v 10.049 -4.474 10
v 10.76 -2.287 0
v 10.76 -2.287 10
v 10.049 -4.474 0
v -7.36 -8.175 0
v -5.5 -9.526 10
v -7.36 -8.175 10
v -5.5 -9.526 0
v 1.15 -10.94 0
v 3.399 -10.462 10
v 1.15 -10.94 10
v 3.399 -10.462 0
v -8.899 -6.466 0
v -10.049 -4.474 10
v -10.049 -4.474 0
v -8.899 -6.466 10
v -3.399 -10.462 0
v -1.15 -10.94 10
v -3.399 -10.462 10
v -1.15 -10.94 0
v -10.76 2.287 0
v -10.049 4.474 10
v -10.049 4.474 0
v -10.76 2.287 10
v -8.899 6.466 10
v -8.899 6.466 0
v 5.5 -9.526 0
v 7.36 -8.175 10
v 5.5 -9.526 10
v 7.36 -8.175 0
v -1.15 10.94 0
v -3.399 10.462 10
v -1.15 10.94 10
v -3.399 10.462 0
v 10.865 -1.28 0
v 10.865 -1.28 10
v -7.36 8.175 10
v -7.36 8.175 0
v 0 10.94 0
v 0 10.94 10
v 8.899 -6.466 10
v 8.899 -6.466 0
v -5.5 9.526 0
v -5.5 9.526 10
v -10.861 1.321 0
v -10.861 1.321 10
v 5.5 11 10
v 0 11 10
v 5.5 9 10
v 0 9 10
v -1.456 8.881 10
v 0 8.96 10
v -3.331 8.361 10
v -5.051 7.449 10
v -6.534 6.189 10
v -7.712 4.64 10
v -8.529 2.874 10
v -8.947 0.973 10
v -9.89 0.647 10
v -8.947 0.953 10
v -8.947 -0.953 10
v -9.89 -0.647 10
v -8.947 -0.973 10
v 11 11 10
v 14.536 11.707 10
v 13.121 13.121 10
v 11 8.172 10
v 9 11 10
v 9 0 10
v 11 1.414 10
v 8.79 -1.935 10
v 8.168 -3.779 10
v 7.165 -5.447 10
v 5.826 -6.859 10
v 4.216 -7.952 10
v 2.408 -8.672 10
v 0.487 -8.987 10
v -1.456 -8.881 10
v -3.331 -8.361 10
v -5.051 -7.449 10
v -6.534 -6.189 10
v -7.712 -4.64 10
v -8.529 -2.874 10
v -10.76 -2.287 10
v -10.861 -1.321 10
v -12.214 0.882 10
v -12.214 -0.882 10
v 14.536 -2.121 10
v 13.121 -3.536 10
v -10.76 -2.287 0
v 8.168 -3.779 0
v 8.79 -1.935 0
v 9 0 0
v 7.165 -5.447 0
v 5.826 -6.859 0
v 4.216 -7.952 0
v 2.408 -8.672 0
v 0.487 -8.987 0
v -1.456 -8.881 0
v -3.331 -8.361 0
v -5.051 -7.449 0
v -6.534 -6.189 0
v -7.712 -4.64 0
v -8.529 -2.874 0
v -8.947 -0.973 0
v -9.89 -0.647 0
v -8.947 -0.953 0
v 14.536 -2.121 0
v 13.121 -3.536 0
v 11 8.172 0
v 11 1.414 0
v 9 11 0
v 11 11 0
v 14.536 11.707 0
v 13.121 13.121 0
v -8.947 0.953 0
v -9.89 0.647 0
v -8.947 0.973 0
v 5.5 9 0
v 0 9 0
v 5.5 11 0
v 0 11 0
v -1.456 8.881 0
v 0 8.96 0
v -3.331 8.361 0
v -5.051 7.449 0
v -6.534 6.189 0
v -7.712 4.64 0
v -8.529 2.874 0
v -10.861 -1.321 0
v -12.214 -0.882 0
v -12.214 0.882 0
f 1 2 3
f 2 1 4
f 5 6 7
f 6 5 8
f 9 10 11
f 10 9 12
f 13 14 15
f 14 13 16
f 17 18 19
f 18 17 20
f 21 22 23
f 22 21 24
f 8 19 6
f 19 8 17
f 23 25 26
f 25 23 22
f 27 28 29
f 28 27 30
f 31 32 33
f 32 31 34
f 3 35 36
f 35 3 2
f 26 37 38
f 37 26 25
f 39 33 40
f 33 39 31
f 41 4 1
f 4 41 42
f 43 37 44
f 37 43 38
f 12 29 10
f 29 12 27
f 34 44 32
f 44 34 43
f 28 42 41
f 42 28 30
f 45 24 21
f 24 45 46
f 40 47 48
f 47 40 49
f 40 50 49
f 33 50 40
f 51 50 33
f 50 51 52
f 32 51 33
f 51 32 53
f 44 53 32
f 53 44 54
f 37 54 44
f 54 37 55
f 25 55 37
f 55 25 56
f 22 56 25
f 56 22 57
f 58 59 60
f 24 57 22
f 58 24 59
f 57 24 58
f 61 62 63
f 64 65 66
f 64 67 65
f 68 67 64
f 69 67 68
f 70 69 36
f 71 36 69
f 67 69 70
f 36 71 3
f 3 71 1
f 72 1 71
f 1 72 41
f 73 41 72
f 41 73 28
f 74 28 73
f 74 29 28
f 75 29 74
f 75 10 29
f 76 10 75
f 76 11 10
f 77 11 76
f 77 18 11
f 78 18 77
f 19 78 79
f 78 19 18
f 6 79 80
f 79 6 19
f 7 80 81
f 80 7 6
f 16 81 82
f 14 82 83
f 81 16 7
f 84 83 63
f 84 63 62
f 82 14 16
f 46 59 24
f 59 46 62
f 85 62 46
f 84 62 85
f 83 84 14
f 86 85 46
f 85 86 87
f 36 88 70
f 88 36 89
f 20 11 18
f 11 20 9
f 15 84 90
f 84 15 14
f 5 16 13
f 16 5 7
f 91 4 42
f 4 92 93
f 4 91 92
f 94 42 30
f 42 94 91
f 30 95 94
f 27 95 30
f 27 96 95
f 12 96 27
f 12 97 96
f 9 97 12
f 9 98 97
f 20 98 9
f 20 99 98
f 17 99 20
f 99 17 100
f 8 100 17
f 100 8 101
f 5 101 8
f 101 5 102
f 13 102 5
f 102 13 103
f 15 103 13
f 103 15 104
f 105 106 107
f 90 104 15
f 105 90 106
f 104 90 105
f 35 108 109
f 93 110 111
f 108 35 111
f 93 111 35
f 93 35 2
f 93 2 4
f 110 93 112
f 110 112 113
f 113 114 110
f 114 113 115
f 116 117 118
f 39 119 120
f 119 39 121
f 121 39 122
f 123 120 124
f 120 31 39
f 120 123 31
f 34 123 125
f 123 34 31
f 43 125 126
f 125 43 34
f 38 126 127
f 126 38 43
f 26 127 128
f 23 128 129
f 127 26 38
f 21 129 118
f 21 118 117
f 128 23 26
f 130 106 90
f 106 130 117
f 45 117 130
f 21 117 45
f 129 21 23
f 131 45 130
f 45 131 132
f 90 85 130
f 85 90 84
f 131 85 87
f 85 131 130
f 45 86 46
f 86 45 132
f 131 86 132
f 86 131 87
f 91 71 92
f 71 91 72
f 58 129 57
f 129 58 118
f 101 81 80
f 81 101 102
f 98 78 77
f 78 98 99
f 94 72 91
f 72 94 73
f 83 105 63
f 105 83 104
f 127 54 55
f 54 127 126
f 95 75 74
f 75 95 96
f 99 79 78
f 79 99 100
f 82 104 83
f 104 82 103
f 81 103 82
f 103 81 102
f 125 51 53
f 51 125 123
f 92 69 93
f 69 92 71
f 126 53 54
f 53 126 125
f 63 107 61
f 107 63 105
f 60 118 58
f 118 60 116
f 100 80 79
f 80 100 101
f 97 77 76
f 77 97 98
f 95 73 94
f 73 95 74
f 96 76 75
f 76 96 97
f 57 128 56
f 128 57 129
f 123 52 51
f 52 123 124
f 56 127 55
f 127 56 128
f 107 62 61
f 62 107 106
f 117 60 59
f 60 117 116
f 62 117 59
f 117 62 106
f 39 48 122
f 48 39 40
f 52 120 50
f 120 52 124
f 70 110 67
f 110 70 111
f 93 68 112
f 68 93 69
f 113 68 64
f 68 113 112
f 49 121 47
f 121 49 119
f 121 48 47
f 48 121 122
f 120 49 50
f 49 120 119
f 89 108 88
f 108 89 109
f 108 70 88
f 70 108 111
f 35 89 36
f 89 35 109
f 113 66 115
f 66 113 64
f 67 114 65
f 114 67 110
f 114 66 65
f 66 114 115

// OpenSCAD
// Clip to attach Apple bluetooth keyboard (2 AA battery version) to
// Apple bluetooth (magic somethingorother) touchpad
// by Neil Isaac <isaac.neil@gmail.com> 28 Dec. 2013

// Length of the clip (distance from left side to right side)
// 75mm for the long clip, 10mm for the end clips
length = 10;

// The radius of the battery holder
// Adjust as needed for a snug fit
inner_radius = 9;

// Thickness of the cylindrical shell
// Adjust for structure and print quality
thickness = 2;

// Radius of the notch for the rubber pads
notch_radius = 1.1;

// Length of the flat part on top of the battery holder 
cover_length = 11;

// Length of the straight part for support under the battery holder
curl_length = 5.5;

// Bump on the bottom as a support
bump_radius = 1.5;

// Pen holder height
// Set to 0 to remove
pen_height = 5;

outer_radius = inner_radius + thickness;

difference(){

union(){

// Main cylinder
cylinder(length, outer_radius, outer_radius);

// Bump to add support for the notch
translate([-outer_radius, 0, 0])
cylinder(length, bump_radius, bump_radius);

}

// Cut out the middle
cylinder(length, inner_radius, inner_radius);

// Cut out notch for the rubber pad
translate([-inner_radius, 0, 0])
#cylinder(length, notch_radius, notch_radius);

// Cut out 1/4 of the circle
cube([outer_radius, outer_radius, length]);

}

// Flat cover on top 
translate([inner_radius, 0, 0])
cube([thickness, cover_length, length]);

// Extra support underneath
translate([0, inner_radius, 0])
cube([curl_length, thickness, length]);

// Close pen holder
translate([outer_radius - thickness / sqrt(2), 0, 0])
rotate([0, 0, -45])
#cube([pen_height, thickness, length]);

// Far pen holder
translate([outer_radius, cover_length - sqrt(2) * thickness, 0])
rotate([0, 0, 45])
#cube([pen_height, thickness, length]);
